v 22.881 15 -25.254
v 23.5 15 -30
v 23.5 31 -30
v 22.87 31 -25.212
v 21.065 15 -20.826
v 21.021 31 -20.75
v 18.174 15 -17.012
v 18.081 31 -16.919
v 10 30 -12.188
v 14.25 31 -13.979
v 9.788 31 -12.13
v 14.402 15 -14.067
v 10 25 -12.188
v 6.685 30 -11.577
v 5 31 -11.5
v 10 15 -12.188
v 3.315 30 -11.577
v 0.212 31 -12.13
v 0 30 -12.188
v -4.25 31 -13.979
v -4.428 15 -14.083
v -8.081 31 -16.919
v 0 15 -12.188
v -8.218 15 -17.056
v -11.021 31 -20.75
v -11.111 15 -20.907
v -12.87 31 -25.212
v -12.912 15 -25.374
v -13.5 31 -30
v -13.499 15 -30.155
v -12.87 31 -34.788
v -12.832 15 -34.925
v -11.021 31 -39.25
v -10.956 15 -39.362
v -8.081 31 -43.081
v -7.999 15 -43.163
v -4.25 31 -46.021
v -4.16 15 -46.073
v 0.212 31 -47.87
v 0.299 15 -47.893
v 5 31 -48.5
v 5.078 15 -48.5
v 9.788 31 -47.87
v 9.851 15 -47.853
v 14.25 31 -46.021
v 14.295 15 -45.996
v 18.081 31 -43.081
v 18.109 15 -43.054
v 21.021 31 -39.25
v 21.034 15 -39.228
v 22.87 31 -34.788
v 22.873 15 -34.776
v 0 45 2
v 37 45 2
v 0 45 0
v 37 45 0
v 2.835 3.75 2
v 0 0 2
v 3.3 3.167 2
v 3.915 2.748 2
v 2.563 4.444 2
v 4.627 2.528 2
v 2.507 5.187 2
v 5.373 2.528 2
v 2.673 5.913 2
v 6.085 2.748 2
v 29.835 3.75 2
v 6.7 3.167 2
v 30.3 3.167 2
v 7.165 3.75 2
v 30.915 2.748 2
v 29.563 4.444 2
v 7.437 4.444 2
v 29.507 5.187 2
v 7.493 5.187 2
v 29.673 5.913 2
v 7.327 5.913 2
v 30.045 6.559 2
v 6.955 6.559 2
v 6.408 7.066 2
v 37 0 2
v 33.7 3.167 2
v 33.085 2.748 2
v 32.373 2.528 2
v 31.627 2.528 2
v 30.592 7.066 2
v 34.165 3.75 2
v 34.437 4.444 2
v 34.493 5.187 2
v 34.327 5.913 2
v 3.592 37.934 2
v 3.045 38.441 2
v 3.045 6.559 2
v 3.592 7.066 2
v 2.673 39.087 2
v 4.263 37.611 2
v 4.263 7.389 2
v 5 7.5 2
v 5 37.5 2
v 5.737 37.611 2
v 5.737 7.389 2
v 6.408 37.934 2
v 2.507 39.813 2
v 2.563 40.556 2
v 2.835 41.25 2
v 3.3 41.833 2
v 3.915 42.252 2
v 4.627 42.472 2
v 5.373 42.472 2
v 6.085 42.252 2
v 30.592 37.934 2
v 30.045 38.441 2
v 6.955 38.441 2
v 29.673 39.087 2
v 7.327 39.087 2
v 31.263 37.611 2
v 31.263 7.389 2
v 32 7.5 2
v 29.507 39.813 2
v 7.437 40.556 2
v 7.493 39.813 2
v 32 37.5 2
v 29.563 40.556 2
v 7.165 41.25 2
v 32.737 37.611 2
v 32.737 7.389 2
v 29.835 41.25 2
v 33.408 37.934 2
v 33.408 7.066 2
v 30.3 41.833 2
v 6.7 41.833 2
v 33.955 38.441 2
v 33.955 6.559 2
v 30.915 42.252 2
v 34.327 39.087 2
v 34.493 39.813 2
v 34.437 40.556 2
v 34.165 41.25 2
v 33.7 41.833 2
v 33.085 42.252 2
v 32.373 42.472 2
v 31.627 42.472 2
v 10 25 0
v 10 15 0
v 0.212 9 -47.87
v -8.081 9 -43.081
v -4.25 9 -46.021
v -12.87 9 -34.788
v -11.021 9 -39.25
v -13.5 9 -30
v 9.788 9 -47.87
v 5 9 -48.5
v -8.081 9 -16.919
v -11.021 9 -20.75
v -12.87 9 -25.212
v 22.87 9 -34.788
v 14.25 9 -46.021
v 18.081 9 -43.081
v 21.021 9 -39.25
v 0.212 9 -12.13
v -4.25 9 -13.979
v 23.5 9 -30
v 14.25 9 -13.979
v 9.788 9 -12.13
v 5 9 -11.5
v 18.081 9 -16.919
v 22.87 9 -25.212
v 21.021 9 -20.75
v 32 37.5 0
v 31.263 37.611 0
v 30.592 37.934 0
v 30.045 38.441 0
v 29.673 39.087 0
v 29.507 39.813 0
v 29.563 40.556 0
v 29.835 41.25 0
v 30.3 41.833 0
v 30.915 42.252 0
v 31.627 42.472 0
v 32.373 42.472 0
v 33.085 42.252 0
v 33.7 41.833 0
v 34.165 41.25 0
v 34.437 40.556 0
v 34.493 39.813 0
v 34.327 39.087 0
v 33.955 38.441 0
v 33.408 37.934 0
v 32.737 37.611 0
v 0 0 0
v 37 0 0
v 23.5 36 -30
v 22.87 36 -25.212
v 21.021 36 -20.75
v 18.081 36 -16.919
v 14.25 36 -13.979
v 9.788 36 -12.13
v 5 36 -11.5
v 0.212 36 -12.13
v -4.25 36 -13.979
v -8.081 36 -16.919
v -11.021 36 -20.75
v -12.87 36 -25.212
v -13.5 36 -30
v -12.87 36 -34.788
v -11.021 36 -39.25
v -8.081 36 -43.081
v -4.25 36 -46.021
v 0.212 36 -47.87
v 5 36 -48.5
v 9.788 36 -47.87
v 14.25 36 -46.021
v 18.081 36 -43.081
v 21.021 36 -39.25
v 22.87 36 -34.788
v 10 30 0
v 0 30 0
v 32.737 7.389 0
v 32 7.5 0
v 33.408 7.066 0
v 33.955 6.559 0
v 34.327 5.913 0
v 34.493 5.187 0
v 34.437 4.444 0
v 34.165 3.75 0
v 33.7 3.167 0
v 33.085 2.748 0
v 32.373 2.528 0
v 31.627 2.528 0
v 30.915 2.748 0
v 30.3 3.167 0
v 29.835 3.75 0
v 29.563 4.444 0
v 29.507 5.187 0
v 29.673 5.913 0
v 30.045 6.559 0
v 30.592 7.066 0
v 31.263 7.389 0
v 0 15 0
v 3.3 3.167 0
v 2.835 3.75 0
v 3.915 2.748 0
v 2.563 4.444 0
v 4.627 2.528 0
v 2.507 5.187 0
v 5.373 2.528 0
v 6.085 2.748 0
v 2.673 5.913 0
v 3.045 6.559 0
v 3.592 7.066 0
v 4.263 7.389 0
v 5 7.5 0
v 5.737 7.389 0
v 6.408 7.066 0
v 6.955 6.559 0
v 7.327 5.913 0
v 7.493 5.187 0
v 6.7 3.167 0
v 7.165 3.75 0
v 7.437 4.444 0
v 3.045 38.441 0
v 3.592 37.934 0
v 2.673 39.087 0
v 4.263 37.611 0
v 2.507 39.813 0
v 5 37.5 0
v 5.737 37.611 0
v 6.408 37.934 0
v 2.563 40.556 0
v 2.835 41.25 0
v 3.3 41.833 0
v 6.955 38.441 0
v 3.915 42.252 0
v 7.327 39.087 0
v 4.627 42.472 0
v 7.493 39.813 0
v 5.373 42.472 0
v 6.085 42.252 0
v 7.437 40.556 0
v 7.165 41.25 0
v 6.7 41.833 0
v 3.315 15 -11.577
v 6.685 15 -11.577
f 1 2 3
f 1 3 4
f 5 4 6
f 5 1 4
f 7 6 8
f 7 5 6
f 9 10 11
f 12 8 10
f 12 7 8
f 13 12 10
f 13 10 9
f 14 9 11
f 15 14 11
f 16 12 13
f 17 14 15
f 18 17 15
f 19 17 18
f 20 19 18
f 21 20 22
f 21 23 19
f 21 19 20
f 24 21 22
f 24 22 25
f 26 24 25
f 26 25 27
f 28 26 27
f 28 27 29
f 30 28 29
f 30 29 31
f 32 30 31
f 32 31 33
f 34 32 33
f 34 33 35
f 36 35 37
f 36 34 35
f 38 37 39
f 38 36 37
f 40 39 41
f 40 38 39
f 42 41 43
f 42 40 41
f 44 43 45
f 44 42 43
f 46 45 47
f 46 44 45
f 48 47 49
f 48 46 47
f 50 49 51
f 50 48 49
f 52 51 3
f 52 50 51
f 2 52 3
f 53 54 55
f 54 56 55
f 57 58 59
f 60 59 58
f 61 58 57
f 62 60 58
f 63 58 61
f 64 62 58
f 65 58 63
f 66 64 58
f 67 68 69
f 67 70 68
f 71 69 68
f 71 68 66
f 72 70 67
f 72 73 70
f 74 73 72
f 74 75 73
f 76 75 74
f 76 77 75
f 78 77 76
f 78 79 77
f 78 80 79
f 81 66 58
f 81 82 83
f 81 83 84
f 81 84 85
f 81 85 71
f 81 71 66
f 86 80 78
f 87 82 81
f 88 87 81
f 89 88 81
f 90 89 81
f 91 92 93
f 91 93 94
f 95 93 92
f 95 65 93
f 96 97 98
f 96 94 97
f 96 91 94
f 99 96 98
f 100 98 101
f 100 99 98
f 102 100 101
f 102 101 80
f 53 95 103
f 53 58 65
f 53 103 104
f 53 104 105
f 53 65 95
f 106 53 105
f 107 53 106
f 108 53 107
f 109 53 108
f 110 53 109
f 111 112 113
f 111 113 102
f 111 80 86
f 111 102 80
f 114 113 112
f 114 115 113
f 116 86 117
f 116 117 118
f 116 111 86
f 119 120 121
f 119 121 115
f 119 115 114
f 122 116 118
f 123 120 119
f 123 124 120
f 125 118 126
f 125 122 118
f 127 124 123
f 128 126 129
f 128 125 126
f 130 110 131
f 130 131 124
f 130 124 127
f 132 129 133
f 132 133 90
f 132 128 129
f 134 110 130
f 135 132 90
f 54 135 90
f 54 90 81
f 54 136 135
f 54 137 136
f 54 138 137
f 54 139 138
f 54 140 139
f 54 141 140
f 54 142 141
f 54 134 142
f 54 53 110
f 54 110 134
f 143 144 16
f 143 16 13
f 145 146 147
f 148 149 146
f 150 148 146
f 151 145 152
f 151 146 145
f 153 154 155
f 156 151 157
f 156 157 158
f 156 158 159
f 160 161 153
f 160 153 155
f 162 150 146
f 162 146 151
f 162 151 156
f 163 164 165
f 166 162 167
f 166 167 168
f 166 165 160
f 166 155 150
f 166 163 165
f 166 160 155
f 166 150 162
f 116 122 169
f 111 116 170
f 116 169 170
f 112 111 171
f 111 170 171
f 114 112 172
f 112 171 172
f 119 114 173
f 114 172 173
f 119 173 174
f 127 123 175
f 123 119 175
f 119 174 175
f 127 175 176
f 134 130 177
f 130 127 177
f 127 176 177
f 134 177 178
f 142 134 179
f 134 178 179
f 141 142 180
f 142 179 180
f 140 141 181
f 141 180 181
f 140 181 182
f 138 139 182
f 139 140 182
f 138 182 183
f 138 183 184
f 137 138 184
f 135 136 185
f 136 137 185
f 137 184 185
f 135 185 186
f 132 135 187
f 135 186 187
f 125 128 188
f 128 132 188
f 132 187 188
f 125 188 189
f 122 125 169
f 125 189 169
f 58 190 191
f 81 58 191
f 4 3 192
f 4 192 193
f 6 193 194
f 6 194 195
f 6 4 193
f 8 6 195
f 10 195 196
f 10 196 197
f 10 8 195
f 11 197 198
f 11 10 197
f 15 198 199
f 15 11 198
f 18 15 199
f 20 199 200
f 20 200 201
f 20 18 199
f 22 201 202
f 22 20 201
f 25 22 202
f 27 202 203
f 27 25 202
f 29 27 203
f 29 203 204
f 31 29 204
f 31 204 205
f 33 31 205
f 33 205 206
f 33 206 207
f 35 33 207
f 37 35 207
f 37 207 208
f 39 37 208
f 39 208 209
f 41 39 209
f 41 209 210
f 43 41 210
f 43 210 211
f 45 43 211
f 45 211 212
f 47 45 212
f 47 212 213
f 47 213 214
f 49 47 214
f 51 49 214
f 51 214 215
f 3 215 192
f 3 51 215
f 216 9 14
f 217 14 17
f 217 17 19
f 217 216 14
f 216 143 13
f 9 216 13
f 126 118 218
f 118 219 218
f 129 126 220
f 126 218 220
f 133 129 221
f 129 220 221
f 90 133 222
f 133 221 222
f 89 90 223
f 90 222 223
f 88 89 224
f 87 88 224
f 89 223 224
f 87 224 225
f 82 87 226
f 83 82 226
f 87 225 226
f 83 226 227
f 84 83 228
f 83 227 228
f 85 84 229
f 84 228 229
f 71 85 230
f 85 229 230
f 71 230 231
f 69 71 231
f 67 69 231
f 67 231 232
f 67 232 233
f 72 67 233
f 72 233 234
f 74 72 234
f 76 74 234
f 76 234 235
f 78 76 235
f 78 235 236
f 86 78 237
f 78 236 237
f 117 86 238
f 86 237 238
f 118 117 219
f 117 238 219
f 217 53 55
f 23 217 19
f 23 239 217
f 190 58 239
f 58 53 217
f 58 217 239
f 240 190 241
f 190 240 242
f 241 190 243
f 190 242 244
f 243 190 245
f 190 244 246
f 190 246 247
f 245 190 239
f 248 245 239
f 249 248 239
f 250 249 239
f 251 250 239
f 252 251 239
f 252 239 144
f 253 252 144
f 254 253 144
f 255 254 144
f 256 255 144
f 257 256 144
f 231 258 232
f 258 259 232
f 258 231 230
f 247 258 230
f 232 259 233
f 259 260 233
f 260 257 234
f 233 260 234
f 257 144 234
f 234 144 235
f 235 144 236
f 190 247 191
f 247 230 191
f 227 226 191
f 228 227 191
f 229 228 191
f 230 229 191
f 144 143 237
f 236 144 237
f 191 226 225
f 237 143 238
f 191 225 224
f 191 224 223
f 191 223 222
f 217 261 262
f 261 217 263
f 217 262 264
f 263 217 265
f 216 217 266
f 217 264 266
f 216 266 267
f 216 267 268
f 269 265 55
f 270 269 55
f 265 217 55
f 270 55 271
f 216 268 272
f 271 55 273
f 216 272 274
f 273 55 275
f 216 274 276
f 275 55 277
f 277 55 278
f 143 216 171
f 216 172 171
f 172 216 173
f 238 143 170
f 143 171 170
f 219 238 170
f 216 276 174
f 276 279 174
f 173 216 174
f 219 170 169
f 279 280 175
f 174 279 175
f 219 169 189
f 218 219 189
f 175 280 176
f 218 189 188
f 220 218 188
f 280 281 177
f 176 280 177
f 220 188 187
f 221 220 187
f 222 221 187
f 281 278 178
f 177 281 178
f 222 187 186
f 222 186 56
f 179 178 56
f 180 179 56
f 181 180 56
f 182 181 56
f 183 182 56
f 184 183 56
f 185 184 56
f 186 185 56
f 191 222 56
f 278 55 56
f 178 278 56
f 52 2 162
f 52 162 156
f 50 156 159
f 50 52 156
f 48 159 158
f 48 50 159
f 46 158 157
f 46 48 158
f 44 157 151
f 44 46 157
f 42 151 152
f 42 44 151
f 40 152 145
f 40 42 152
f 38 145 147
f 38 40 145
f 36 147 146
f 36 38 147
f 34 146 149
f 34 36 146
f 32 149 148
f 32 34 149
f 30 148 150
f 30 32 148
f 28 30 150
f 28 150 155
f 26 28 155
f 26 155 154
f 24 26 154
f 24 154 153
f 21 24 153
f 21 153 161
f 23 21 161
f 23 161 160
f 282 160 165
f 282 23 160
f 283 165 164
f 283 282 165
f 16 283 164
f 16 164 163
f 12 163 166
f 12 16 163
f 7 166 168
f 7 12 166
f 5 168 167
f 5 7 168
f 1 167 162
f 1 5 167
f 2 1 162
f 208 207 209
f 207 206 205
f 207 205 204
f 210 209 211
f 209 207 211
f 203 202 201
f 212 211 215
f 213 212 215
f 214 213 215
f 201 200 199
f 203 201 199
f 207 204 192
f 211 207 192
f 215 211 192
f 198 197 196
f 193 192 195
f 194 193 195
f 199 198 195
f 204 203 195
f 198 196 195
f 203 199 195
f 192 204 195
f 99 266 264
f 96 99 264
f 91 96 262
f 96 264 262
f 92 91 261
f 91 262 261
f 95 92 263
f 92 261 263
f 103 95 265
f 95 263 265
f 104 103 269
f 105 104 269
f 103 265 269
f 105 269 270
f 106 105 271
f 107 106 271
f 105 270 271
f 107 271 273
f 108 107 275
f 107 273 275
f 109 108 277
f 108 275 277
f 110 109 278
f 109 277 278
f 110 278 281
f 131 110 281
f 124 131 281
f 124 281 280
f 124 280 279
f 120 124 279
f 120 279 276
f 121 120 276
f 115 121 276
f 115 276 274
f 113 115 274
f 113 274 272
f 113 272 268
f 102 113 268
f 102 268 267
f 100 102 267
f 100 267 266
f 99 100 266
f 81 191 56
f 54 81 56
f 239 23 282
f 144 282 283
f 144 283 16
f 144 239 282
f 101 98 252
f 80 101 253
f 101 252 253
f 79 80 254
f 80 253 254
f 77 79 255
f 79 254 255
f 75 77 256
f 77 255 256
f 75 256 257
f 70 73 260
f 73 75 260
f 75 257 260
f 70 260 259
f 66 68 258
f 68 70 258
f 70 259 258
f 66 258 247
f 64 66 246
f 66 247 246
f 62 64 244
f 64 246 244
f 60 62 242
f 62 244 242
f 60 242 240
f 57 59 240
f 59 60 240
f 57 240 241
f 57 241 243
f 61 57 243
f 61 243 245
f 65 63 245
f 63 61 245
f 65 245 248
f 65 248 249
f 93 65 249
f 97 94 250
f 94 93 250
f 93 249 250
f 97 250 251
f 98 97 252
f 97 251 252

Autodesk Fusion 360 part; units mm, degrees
sketch "Sketch1" plane through (0, 0, 0) normal (0, 0, 1) x (1, 0, 0)
  line L0 (0, 0) -> (37, 0)
  line L1 (37, 0) -> (37, 45)
  line L2 (37, 45) -> (0, 45)
  line L3 (0, 45) -> (0, 0)
  dimension "d1" = 37
  dimension "d2" = 45
extrude "Extrude1" add sketch "Sketch1" along normal blind 2
sketch "Sketch2" plane through (0, 0, 2) normal (0, 0, 1) x (-1, 0, 0)
  line L0 (0, -45) -> (0, 0)
  line L1 (0, 0) -> (-37, 0)
  line L2 (-37, 0) -> (-37, -45)
  line L3 (-37, -45) -> (0, -45)
sketch "Sketch3" plane through (0, 0, 2) normal (0, 0, 1) x (-1, 0, 0)
sketch "Sketch4" plane through (0, 0, 2) normal (0, 0, 1) x (-1, 0, 0)
  point P0 (-5, -40)
hole "Hole1" at (5, 40, 2) direction (0, 0, -1) diameter 5 depth 15 tip angle 180
ref_plane "WorkPlane1" through (18.5, 22.5, 1) normal (1, 0, 0) x (0, 1, 0)
ref_plane "WorkPlane2" through (18.5, 22.5, 1) normal (0, -1, 0) x (1, 0, 0)
mirror "Mirror1" about plane through (18.5, 22.5, 1) normal (1, 0, 0) of "Hole1"
mirror "Mirror2" about plane through (18.5, 22.5, 1) normal (0, -1, 0) of "Hole1", "Mirror1"
sketch "Sketch5" plane through (0, 0, 0) normal (0, 0, -1) x (1, 0, 0)
  circle A0 centre (32, -5) radius 2.5
  circle A1 centre (5, -5) radius 2.5
  circle A2 centre (32, -40) radius 2.5
  circle A3 centre (5, -40) radius 2.5
  line L0 (0, 0) -> (0, -45)
  line L1 (0, -45) -> (37, -45)
  line L2 (37, -45) -> (37, 0)
  line L3 (37, 0) -> (0, 0)
  line L4 (0, -15) -> (10, -15)
  line L5 (10, -15) -> (10, -25)
  line L6 (10, -25) -> (0, -25)
  line L7 (0, -25) -> (0, -15)
extrude "Extrude2" add sketch "Sketch5" along normal blind 35 contours L0 L4 L5 L6 L7
sketch "Sketch6" plane through (0, 15, 0) normal (0, -1, 0) x (1, 0, 0)
  line L0 (10, 0) -> (0, 0)
  line L1 (0, 0) -> (0, -35)
  line L2 (0, -35) -> (10, -35)
  line L3 (10, -35) -> (10, 0)
  point P0 (0, -30)
sketch "Sketch7" plane through (0, 15, 0) normal (0, -1, 0) x (1, 0, 0)
sketch "Sketch8" plane through (0, 15, 0) normal (0, -1, 0) x (1, 0, 0)
  circle A0 centre (5, -30) radius 18.5
  dimension "d14" = 37
extrude "Extrude3" add sketch "Sketch8" against normal blind 16
extrude "Extrude4" add 1 faces at (3.6278, 31, -23.9879) along direction (0, -1, 0) blind 22
extrude "Extrude5" add 1 faces at (5, 25, -3.8333) along direction (0, 1, 0) blind 5
extrude "Extrude6" add 1 faces at (3.6278, 31, -23.9879) along direction (0, 1, 0) blind 5
